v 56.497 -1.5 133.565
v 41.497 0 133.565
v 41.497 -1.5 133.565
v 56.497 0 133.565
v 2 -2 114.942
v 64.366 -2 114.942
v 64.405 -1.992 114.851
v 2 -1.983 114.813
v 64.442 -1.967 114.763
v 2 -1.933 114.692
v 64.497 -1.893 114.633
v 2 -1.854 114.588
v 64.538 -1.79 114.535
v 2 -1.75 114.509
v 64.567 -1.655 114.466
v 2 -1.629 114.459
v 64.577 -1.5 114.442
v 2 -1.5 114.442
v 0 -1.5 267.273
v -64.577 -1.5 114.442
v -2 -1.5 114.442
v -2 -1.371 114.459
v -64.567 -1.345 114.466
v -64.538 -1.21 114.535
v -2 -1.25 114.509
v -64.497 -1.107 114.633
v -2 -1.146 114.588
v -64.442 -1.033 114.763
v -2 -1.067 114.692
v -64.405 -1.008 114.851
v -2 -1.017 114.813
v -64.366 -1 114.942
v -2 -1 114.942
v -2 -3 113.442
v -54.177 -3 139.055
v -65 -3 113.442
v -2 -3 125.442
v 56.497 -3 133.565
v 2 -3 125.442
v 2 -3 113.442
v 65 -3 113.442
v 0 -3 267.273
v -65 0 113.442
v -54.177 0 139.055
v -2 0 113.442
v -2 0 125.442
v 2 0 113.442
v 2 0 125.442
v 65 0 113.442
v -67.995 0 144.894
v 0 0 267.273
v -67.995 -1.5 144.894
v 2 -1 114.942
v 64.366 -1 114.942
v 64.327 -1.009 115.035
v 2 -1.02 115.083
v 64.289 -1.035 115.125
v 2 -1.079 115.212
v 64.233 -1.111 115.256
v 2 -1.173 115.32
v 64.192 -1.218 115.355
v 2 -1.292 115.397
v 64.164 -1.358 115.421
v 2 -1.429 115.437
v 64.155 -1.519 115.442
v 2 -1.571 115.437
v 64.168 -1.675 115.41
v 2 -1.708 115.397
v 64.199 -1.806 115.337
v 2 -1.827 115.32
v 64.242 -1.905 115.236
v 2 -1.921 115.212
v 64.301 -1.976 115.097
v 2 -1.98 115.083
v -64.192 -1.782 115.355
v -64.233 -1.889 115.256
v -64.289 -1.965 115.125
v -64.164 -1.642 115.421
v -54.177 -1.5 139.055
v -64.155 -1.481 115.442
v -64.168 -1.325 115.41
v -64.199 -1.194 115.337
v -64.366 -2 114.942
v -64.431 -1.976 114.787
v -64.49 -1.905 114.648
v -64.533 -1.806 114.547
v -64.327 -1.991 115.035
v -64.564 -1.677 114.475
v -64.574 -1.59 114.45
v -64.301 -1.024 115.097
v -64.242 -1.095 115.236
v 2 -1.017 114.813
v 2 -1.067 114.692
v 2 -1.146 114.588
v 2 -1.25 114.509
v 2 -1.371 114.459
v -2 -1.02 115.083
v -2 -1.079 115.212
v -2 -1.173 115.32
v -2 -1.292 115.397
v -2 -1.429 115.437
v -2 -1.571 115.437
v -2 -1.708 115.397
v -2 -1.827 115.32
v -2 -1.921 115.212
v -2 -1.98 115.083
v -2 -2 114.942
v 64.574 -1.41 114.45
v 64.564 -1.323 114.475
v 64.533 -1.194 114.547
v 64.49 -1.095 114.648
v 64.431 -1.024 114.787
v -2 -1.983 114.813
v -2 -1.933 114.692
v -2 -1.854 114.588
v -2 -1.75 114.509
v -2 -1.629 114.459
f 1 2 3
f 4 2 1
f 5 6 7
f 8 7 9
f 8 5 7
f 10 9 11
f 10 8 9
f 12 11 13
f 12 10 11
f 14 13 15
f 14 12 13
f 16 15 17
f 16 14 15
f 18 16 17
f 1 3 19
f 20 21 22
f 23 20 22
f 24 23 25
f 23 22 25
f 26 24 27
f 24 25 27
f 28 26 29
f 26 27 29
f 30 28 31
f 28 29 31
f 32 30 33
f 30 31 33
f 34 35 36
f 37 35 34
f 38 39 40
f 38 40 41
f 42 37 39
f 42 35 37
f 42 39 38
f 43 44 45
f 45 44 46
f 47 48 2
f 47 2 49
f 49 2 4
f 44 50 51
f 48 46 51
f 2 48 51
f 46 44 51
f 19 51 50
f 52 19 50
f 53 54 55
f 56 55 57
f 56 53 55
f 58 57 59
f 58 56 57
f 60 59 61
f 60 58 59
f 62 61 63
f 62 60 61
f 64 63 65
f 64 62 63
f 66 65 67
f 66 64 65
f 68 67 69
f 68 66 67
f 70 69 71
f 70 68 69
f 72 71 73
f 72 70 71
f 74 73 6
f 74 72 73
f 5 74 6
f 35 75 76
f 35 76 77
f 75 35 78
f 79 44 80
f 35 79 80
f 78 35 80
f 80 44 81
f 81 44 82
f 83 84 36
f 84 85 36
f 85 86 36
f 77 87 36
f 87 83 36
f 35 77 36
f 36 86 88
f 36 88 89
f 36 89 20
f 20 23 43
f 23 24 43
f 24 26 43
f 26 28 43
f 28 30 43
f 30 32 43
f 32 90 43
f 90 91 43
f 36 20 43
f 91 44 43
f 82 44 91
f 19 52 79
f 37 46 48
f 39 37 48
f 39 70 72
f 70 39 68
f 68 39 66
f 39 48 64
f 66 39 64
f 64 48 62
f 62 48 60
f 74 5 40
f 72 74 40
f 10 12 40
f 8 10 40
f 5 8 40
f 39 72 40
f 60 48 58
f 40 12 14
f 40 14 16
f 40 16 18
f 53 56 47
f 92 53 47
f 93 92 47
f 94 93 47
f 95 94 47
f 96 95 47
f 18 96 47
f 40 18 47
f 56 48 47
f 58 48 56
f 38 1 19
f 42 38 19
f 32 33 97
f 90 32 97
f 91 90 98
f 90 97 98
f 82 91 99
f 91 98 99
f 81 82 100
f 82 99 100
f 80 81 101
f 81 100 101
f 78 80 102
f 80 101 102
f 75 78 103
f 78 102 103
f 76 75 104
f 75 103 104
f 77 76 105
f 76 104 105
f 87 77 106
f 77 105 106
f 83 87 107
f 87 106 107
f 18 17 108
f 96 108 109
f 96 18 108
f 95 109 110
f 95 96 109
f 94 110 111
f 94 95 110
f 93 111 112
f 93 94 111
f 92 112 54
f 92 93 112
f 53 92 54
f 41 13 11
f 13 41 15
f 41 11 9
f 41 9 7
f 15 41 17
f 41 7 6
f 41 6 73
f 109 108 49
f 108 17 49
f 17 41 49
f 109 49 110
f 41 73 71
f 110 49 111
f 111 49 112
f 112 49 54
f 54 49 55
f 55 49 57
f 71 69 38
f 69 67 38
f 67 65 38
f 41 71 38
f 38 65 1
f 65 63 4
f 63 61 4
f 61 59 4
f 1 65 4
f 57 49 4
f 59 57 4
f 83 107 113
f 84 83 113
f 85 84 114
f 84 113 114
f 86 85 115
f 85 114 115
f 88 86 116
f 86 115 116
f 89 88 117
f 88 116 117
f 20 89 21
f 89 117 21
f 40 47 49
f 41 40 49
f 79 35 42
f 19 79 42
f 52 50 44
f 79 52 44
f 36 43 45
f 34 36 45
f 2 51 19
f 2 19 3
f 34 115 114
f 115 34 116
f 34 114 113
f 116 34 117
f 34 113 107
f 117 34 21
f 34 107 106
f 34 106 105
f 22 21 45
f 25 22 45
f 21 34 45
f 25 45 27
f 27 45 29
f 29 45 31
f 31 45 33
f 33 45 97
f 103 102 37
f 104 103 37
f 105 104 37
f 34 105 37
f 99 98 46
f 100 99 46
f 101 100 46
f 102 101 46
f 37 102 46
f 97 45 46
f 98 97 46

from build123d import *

# Parameters (mm, degrees)
F1_DEPTH      = 3
F3_DEPTH      = 70
F3_DEPTH_BACK = 70
F4_DEPTH      = 1.5
F6_DEPTH      = 1.5


with BuildPart() as f1:
    # F0 (on Front) → F1 (new body)
    with BuildSketch(Plane.XZ):
        Polygon((-54.177348, 139.05524), (-65, 113.442006), (-2, 113.442006), (-2, 125.442006), (2, 125.442006), (2, 113.442006), (65, 113.442006), (56.497385, 133.564567), (41.497385, 133.564567), (0, 267.273082), align=None)
        Polygon((-67.99451, 144.893563), (-54.177348, 139.05524), (0, 267.273082), align=None)
        Polygon((56.497385, 133.564567), (0, 267.273082), (41.497385, 133.564567), align=None)
    extrude(amount=F1_DEPTH)

    # F2 (on face) → F3 (cut, two sides)
    with BuildSketch(Plane.YZ.offset(-2)) as f3_sk:
        with BuildLine():
            ThreePointArc((-1.5, 114.442006), (-1.146447, 114.588452), (-1, 114.942006))
            ThreePointArc((-1, 114.942006), (-1.5, 115.442006), (-2, 114.942006))
            ThreePointArc((-2, 114.942006), (-1.853553, 114.588452), (-1.5, 114.442006))
        make_face()
    extrude(amount=F3_DEPTH, mode=Mode.SUBTRACT)
    extrude(f3_sk.sketch, amount=-F3_DEPTH_BACK, mode=Mode.SUBTRACT)

    # F0 (on Front) → F4 (cut)
    with BuildSketch(Plane.XZ):
        Polygon((56.497385, 133.564567), (0, 267.273082), (41.497385, 133.564567), align=None)
    extrude(amount=F4_DEPTH, mode=Mode.SUBTRACT)

    # F5 (on face) → F6 (cut)
    with BuildSketch(Plane.XZ.offset(3)):
        Polygon((-67.99451, 144.893563), (-54.177348, 139.05524), (0, 267.273082), align=None)
    extrude(amount=-F6_DEPTH, mode=Mode.SUBTRACT)


solid = f1.part
